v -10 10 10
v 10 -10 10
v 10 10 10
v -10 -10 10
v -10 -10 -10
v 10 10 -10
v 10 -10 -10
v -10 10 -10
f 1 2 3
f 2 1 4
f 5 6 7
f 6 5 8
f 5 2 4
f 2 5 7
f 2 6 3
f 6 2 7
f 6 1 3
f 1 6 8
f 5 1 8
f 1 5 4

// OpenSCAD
// Basic OpenSCAD Shapes Examples
// Use this file to learn fundamental OpenSCAD operations

// Cube
cube([20, 20, 20], center=true);

// Sphere
// sphere(r=10);

// Cylinder
// cylinder(h=20, r=10, center=true);

// Union example
// union() {
//     cube([20, 20, 20], center=true);
//     sphere(r=12);
// }

// Difference example
// difference() {
//     cube([20, 20, 20], center=true);
//     sphere(r=12);
// }

// Intersection example
// intersection() {
//     cube([20, 20, 20], center=true);
//     sphere(r=12);
// }

// Translation
// translate([30, 0, 0]) {
//     cube([10, 10, 10], center=true);
// }

// Rotation
// rotate([0, 0, 45]) {
//     cube([20, 5, 5], center=true);
// }

// Scaling
// scale([2, 1, 0.5]) {
//     cube([10, 10, 10], center=true);
// }
